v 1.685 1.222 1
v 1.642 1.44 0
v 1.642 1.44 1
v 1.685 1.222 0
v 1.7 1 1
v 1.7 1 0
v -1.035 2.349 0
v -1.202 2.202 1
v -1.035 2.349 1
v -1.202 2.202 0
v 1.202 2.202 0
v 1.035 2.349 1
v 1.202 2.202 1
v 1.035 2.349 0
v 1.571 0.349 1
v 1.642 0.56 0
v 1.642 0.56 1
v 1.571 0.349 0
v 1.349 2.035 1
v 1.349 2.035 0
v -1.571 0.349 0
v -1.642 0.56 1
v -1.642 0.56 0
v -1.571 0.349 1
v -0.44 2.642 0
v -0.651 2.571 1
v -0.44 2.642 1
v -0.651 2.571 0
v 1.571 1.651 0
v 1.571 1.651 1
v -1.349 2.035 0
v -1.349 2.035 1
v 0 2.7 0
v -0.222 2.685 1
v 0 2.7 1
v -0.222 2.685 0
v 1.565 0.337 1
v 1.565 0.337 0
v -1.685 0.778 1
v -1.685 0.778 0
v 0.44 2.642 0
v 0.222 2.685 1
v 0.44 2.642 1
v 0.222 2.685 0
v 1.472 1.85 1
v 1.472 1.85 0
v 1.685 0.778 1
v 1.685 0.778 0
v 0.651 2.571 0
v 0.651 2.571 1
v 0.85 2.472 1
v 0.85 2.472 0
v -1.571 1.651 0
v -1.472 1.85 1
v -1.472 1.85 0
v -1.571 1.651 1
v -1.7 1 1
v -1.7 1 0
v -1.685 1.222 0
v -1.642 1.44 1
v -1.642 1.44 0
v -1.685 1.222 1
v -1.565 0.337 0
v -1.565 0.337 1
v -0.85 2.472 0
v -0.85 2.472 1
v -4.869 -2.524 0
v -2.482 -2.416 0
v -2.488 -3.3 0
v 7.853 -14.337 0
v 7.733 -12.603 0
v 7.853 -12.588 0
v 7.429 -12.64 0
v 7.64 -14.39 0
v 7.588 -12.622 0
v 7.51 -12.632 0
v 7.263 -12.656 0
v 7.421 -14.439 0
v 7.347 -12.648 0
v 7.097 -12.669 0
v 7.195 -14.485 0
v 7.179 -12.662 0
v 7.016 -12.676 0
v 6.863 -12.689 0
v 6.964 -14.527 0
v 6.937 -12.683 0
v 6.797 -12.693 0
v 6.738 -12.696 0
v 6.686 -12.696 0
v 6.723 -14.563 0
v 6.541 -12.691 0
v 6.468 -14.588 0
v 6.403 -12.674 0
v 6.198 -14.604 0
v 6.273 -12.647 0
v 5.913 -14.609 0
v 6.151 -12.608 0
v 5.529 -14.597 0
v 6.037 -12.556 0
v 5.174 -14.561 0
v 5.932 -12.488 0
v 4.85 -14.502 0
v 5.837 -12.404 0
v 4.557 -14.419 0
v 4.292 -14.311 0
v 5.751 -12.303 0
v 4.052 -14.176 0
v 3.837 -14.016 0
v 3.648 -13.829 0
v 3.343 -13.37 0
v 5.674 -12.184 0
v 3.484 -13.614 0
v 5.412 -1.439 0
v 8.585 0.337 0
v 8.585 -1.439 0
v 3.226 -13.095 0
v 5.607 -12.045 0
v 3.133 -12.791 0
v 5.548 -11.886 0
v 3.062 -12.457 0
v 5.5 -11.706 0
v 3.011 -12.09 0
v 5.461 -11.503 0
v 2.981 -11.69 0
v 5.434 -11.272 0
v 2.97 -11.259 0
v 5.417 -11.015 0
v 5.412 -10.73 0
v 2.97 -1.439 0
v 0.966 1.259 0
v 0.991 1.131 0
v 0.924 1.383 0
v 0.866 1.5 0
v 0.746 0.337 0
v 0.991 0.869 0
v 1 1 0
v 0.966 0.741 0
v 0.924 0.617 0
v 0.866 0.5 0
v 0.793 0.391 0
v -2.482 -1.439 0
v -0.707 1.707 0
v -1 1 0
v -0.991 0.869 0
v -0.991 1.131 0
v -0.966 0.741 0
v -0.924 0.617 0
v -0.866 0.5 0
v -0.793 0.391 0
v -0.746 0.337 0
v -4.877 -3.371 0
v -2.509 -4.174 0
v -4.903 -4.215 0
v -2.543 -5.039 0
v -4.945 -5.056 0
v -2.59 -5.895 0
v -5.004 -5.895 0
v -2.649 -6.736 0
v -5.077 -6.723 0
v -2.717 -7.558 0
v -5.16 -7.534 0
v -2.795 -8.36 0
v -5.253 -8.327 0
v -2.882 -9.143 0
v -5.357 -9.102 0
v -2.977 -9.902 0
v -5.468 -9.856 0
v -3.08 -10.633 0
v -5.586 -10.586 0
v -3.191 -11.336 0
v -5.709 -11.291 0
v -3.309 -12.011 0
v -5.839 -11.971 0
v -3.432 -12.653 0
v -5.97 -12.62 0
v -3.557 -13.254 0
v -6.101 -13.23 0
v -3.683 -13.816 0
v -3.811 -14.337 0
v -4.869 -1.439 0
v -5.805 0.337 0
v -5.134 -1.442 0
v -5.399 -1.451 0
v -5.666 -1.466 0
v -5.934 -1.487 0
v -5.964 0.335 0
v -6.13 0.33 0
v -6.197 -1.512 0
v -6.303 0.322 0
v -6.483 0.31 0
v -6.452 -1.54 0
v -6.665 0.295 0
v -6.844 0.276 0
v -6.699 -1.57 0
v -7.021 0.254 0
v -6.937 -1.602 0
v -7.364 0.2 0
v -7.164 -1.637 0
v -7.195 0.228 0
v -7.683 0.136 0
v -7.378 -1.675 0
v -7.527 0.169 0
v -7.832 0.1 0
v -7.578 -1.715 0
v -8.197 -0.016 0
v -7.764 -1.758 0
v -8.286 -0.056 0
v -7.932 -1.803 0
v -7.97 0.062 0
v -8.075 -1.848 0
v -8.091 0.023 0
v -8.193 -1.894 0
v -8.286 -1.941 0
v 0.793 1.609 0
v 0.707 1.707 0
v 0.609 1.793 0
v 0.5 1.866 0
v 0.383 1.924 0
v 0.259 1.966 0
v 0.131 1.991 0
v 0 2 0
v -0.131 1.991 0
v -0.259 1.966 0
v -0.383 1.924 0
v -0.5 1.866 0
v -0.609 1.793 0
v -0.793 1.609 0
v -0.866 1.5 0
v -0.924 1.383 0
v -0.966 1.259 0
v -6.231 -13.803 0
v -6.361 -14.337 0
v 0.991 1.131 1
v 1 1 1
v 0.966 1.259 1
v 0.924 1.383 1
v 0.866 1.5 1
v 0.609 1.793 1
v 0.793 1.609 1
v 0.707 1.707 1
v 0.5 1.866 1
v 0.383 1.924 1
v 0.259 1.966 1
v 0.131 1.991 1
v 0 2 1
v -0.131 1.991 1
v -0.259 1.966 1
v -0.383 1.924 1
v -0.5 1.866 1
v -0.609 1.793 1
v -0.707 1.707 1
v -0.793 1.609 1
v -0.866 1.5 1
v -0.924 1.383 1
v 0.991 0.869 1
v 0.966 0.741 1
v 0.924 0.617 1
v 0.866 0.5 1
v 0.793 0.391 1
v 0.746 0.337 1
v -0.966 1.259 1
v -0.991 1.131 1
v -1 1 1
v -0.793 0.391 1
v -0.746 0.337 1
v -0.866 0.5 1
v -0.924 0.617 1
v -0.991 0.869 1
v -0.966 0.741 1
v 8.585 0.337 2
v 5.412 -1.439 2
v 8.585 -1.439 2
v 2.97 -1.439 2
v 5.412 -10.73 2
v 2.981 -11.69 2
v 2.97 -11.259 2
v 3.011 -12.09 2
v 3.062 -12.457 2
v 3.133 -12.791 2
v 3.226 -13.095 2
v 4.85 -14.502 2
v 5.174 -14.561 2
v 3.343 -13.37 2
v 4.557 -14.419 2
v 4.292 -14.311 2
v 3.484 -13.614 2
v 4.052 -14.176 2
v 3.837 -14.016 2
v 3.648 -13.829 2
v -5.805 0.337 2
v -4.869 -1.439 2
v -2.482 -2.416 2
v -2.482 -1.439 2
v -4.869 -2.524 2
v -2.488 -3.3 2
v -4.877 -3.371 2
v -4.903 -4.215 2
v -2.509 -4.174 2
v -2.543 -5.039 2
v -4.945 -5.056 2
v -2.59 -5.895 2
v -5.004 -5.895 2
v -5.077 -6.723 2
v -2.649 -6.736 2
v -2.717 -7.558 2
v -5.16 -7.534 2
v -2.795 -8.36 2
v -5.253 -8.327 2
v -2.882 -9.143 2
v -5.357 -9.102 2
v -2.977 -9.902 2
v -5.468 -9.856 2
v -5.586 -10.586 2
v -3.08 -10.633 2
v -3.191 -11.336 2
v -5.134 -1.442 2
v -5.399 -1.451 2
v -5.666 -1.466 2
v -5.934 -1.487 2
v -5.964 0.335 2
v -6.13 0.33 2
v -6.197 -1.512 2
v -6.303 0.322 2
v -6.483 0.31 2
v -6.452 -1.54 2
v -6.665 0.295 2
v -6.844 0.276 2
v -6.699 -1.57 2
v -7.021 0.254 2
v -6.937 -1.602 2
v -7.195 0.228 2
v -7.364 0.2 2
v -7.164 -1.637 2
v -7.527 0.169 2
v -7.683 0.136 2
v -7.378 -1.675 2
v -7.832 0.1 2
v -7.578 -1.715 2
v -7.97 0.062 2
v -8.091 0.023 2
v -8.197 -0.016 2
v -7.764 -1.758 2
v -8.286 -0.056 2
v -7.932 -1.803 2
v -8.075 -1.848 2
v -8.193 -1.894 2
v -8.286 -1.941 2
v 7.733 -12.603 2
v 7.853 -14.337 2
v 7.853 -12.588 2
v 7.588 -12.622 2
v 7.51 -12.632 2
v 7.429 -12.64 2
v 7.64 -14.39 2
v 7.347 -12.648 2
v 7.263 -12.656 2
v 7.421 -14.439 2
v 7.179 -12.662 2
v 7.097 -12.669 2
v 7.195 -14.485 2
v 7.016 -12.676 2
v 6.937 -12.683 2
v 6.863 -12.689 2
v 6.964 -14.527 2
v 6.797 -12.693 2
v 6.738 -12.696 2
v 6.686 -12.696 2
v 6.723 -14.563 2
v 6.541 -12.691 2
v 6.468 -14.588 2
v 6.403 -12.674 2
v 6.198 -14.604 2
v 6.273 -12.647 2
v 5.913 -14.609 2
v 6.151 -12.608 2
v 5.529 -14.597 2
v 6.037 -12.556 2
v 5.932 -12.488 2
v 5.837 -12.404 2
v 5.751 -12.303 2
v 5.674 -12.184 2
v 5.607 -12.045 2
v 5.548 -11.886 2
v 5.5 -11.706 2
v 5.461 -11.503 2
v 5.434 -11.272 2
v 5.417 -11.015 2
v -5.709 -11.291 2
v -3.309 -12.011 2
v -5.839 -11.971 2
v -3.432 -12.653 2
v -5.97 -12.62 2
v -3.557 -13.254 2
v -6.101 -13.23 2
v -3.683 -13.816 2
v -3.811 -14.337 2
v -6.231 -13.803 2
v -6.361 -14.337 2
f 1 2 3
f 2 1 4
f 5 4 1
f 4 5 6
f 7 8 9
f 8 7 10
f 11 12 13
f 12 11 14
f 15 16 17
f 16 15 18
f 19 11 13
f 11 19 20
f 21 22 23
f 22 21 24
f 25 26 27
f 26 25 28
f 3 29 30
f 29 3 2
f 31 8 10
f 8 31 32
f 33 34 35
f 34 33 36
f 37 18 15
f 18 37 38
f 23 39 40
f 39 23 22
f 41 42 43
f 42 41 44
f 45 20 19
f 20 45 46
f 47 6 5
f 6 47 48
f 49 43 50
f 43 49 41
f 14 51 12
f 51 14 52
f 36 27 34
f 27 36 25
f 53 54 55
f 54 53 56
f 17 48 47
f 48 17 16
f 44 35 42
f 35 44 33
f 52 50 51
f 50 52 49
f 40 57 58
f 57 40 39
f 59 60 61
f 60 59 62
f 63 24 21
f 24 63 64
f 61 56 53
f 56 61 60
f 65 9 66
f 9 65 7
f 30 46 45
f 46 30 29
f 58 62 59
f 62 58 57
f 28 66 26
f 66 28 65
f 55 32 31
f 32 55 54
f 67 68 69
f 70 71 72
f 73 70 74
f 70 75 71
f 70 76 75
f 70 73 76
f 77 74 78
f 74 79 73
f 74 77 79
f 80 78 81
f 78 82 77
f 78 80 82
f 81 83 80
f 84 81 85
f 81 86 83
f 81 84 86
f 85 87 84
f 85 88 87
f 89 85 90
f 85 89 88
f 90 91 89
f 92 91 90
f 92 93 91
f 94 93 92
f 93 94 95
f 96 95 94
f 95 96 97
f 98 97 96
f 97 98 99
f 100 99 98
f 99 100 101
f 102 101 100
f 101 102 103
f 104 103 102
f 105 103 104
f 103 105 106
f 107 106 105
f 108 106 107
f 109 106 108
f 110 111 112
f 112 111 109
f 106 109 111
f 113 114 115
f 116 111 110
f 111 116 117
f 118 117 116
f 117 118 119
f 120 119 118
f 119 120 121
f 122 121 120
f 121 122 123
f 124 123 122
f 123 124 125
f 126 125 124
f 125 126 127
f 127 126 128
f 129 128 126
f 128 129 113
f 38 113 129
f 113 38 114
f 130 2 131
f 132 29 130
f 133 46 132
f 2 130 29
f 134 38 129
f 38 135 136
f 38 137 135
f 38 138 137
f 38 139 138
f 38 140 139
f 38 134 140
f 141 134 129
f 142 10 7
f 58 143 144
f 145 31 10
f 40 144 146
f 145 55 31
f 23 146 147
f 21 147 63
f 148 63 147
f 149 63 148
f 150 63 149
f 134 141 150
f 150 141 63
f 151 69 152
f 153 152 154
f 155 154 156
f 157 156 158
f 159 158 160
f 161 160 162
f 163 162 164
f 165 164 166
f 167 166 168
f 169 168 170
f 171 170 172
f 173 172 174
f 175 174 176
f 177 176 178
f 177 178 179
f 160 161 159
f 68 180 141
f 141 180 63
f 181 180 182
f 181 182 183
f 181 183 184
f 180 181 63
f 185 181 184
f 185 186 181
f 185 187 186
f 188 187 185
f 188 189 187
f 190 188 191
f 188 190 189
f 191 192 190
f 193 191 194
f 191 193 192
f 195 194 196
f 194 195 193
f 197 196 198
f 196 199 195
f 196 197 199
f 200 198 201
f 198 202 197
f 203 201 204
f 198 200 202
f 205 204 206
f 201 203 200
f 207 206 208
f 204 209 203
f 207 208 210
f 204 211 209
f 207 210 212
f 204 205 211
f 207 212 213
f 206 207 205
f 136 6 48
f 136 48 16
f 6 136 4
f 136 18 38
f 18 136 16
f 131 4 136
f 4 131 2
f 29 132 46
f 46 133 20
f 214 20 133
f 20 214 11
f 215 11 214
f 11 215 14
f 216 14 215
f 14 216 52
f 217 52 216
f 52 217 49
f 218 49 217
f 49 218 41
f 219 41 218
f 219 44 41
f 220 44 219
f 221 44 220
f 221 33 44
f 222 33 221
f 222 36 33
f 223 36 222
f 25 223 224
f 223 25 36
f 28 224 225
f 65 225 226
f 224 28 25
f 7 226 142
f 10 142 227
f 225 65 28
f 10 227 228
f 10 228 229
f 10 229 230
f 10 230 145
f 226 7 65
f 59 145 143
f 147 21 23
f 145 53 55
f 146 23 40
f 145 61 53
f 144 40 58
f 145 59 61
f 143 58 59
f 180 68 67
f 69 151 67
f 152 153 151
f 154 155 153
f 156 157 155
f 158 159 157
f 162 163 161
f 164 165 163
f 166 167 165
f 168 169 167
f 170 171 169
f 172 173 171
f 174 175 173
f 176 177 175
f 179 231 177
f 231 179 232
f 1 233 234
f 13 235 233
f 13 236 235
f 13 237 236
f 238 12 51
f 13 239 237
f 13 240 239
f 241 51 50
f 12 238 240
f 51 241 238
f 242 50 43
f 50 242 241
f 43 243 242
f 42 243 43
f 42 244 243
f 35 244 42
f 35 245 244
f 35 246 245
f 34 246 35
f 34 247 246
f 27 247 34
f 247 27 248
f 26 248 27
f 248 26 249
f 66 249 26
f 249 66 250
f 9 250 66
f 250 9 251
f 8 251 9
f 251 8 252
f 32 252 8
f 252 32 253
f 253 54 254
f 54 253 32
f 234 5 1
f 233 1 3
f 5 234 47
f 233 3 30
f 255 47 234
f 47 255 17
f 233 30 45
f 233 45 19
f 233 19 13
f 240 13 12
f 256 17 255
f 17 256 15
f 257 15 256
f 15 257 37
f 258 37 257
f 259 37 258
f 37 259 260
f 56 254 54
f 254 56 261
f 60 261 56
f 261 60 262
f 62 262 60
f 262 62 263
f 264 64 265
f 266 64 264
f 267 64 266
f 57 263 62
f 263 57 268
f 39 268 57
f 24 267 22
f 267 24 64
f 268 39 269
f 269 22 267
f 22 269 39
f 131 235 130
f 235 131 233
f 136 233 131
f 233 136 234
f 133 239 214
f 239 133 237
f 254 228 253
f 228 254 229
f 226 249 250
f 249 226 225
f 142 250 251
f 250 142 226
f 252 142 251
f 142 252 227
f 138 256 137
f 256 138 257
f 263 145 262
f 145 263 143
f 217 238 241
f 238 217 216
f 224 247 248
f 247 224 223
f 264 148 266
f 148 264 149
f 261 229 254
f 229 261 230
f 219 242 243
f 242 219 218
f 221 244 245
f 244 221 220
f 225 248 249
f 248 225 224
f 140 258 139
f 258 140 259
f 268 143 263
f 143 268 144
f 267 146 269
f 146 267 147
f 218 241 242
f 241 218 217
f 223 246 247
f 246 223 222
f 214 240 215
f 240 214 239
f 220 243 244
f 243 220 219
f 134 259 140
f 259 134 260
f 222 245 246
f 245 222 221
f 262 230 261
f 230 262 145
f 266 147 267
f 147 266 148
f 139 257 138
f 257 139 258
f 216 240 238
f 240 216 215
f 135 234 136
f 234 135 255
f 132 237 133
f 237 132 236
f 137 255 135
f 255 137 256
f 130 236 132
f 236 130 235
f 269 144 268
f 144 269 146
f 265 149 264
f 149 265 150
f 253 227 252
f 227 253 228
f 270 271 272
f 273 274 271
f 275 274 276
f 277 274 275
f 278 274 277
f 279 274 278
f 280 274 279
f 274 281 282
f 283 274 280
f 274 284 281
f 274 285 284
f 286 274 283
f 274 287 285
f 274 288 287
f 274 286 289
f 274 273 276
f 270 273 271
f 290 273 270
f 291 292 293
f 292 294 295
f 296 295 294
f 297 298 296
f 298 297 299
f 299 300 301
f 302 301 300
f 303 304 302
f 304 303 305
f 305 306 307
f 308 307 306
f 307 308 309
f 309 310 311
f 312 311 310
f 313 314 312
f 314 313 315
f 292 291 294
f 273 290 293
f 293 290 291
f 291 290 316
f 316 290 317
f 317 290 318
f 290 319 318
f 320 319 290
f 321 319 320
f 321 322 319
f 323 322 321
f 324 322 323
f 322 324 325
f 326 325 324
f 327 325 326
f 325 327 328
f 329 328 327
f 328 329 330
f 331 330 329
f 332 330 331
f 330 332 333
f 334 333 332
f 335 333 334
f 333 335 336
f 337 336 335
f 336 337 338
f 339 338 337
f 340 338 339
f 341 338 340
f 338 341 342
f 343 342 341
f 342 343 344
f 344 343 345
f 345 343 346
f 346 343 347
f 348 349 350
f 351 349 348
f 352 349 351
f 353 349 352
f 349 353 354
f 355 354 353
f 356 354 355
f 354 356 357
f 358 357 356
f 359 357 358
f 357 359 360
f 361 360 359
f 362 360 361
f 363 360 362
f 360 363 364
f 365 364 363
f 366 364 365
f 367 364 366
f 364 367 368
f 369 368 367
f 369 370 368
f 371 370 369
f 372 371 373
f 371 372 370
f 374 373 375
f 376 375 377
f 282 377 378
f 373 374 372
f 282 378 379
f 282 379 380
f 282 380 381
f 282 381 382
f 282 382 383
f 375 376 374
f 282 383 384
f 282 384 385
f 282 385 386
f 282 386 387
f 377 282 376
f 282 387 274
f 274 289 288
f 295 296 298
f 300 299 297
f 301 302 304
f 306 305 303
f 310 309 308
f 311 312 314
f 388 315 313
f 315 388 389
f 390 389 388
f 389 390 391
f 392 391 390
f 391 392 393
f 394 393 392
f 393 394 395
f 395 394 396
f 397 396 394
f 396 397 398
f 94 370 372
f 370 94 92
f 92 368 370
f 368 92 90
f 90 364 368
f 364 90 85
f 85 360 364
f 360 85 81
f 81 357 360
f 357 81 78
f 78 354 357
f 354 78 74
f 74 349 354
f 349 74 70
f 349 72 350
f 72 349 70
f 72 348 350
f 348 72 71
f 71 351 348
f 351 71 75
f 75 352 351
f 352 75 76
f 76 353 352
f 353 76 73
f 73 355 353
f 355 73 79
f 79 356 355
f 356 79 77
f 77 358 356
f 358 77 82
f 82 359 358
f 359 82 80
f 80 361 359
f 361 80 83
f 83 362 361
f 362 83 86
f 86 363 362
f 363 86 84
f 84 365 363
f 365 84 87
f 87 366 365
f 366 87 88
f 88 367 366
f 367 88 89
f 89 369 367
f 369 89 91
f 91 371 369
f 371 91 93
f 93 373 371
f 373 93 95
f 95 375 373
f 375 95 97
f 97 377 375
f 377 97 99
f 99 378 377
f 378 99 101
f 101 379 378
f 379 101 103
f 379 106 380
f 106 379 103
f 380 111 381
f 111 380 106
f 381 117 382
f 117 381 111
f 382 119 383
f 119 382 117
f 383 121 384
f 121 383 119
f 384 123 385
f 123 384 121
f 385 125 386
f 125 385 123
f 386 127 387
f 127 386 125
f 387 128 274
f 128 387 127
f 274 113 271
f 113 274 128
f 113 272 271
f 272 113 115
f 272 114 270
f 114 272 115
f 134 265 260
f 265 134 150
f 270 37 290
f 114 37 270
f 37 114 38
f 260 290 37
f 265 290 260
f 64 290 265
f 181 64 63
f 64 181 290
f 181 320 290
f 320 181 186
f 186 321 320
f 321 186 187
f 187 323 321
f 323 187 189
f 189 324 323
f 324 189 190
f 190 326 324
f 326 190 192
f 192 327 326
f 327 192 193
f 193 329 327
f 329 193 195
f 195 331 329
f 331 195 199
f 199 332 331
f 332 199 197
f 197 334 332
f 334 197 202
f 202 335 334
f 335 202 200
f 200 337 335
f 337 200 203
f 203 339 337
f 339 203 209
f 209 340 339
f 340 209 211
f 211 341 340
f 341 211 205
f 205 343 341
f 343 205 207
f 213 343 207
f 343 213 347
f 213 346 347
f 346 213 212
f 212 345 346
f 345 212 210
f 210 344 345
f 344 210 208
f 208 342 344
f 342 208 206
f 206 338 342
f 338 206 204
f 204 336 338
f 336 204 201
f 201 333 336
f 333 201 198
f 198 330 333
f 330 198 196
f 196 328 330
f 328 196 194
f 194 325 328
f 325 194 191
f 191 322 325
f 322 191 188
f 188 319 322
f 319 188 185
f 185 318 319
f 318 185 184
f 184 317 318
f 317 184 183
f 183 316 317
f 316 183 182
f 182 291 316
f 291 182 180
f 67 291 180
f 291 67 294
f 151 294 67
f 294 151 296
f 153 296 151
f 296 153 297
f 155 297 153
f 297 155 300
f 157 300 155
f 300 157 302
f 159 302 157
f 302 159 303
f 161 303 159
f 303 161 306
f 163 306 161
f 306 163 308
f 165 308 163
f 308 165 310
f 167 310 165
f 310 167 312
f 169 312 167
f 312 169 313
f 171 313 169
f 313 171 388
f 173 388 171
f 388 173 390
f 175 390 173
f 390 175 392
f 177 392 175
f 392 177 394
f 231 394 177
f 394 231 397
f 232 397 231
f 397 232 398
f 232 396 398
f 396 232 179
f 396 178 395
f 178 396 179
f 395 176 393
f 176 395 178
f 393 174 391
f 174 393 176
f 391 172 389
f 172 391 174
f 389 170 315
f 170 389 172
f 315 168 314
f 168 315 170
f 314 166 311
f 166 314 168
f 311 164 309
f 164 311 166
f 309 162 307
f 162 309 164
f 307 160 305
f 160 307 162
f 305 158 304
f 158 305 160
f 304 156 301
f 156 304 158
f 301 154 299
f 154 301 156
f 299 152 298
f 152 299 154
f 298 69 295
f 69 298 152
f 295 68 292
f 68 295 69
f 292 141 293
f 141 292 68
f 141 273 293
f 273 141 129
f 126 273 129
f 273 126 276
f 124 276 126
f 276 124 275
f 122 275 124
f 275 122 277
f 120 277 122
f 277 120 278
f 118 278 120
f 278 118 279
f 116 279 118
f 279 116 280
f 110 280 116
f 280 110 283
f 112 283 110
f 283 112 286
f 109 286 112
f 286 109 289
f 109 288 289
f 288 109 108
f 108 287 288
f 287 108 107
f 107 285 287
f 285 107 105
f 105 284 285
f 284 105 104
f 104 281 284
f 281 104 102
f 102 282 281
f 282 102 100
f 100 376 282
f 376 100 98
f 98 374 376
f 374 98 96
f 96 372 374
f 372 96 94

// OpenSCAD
union() {
  translate([0,1,0]) {
    difference() {
      cylinder(h=1.0, r1=1.7, r2=1.7, $fn=48);
      translate([0,0,-0.1]) {
        cylinder(h=1.7, r1=1, rw=1, $fn=48);
      }
    }
  }
  scale([2, 2, 2]) {
    linear_extrude(height=1.0) {
      text("π", halign="center", valign="top");
    }
  }
}         
